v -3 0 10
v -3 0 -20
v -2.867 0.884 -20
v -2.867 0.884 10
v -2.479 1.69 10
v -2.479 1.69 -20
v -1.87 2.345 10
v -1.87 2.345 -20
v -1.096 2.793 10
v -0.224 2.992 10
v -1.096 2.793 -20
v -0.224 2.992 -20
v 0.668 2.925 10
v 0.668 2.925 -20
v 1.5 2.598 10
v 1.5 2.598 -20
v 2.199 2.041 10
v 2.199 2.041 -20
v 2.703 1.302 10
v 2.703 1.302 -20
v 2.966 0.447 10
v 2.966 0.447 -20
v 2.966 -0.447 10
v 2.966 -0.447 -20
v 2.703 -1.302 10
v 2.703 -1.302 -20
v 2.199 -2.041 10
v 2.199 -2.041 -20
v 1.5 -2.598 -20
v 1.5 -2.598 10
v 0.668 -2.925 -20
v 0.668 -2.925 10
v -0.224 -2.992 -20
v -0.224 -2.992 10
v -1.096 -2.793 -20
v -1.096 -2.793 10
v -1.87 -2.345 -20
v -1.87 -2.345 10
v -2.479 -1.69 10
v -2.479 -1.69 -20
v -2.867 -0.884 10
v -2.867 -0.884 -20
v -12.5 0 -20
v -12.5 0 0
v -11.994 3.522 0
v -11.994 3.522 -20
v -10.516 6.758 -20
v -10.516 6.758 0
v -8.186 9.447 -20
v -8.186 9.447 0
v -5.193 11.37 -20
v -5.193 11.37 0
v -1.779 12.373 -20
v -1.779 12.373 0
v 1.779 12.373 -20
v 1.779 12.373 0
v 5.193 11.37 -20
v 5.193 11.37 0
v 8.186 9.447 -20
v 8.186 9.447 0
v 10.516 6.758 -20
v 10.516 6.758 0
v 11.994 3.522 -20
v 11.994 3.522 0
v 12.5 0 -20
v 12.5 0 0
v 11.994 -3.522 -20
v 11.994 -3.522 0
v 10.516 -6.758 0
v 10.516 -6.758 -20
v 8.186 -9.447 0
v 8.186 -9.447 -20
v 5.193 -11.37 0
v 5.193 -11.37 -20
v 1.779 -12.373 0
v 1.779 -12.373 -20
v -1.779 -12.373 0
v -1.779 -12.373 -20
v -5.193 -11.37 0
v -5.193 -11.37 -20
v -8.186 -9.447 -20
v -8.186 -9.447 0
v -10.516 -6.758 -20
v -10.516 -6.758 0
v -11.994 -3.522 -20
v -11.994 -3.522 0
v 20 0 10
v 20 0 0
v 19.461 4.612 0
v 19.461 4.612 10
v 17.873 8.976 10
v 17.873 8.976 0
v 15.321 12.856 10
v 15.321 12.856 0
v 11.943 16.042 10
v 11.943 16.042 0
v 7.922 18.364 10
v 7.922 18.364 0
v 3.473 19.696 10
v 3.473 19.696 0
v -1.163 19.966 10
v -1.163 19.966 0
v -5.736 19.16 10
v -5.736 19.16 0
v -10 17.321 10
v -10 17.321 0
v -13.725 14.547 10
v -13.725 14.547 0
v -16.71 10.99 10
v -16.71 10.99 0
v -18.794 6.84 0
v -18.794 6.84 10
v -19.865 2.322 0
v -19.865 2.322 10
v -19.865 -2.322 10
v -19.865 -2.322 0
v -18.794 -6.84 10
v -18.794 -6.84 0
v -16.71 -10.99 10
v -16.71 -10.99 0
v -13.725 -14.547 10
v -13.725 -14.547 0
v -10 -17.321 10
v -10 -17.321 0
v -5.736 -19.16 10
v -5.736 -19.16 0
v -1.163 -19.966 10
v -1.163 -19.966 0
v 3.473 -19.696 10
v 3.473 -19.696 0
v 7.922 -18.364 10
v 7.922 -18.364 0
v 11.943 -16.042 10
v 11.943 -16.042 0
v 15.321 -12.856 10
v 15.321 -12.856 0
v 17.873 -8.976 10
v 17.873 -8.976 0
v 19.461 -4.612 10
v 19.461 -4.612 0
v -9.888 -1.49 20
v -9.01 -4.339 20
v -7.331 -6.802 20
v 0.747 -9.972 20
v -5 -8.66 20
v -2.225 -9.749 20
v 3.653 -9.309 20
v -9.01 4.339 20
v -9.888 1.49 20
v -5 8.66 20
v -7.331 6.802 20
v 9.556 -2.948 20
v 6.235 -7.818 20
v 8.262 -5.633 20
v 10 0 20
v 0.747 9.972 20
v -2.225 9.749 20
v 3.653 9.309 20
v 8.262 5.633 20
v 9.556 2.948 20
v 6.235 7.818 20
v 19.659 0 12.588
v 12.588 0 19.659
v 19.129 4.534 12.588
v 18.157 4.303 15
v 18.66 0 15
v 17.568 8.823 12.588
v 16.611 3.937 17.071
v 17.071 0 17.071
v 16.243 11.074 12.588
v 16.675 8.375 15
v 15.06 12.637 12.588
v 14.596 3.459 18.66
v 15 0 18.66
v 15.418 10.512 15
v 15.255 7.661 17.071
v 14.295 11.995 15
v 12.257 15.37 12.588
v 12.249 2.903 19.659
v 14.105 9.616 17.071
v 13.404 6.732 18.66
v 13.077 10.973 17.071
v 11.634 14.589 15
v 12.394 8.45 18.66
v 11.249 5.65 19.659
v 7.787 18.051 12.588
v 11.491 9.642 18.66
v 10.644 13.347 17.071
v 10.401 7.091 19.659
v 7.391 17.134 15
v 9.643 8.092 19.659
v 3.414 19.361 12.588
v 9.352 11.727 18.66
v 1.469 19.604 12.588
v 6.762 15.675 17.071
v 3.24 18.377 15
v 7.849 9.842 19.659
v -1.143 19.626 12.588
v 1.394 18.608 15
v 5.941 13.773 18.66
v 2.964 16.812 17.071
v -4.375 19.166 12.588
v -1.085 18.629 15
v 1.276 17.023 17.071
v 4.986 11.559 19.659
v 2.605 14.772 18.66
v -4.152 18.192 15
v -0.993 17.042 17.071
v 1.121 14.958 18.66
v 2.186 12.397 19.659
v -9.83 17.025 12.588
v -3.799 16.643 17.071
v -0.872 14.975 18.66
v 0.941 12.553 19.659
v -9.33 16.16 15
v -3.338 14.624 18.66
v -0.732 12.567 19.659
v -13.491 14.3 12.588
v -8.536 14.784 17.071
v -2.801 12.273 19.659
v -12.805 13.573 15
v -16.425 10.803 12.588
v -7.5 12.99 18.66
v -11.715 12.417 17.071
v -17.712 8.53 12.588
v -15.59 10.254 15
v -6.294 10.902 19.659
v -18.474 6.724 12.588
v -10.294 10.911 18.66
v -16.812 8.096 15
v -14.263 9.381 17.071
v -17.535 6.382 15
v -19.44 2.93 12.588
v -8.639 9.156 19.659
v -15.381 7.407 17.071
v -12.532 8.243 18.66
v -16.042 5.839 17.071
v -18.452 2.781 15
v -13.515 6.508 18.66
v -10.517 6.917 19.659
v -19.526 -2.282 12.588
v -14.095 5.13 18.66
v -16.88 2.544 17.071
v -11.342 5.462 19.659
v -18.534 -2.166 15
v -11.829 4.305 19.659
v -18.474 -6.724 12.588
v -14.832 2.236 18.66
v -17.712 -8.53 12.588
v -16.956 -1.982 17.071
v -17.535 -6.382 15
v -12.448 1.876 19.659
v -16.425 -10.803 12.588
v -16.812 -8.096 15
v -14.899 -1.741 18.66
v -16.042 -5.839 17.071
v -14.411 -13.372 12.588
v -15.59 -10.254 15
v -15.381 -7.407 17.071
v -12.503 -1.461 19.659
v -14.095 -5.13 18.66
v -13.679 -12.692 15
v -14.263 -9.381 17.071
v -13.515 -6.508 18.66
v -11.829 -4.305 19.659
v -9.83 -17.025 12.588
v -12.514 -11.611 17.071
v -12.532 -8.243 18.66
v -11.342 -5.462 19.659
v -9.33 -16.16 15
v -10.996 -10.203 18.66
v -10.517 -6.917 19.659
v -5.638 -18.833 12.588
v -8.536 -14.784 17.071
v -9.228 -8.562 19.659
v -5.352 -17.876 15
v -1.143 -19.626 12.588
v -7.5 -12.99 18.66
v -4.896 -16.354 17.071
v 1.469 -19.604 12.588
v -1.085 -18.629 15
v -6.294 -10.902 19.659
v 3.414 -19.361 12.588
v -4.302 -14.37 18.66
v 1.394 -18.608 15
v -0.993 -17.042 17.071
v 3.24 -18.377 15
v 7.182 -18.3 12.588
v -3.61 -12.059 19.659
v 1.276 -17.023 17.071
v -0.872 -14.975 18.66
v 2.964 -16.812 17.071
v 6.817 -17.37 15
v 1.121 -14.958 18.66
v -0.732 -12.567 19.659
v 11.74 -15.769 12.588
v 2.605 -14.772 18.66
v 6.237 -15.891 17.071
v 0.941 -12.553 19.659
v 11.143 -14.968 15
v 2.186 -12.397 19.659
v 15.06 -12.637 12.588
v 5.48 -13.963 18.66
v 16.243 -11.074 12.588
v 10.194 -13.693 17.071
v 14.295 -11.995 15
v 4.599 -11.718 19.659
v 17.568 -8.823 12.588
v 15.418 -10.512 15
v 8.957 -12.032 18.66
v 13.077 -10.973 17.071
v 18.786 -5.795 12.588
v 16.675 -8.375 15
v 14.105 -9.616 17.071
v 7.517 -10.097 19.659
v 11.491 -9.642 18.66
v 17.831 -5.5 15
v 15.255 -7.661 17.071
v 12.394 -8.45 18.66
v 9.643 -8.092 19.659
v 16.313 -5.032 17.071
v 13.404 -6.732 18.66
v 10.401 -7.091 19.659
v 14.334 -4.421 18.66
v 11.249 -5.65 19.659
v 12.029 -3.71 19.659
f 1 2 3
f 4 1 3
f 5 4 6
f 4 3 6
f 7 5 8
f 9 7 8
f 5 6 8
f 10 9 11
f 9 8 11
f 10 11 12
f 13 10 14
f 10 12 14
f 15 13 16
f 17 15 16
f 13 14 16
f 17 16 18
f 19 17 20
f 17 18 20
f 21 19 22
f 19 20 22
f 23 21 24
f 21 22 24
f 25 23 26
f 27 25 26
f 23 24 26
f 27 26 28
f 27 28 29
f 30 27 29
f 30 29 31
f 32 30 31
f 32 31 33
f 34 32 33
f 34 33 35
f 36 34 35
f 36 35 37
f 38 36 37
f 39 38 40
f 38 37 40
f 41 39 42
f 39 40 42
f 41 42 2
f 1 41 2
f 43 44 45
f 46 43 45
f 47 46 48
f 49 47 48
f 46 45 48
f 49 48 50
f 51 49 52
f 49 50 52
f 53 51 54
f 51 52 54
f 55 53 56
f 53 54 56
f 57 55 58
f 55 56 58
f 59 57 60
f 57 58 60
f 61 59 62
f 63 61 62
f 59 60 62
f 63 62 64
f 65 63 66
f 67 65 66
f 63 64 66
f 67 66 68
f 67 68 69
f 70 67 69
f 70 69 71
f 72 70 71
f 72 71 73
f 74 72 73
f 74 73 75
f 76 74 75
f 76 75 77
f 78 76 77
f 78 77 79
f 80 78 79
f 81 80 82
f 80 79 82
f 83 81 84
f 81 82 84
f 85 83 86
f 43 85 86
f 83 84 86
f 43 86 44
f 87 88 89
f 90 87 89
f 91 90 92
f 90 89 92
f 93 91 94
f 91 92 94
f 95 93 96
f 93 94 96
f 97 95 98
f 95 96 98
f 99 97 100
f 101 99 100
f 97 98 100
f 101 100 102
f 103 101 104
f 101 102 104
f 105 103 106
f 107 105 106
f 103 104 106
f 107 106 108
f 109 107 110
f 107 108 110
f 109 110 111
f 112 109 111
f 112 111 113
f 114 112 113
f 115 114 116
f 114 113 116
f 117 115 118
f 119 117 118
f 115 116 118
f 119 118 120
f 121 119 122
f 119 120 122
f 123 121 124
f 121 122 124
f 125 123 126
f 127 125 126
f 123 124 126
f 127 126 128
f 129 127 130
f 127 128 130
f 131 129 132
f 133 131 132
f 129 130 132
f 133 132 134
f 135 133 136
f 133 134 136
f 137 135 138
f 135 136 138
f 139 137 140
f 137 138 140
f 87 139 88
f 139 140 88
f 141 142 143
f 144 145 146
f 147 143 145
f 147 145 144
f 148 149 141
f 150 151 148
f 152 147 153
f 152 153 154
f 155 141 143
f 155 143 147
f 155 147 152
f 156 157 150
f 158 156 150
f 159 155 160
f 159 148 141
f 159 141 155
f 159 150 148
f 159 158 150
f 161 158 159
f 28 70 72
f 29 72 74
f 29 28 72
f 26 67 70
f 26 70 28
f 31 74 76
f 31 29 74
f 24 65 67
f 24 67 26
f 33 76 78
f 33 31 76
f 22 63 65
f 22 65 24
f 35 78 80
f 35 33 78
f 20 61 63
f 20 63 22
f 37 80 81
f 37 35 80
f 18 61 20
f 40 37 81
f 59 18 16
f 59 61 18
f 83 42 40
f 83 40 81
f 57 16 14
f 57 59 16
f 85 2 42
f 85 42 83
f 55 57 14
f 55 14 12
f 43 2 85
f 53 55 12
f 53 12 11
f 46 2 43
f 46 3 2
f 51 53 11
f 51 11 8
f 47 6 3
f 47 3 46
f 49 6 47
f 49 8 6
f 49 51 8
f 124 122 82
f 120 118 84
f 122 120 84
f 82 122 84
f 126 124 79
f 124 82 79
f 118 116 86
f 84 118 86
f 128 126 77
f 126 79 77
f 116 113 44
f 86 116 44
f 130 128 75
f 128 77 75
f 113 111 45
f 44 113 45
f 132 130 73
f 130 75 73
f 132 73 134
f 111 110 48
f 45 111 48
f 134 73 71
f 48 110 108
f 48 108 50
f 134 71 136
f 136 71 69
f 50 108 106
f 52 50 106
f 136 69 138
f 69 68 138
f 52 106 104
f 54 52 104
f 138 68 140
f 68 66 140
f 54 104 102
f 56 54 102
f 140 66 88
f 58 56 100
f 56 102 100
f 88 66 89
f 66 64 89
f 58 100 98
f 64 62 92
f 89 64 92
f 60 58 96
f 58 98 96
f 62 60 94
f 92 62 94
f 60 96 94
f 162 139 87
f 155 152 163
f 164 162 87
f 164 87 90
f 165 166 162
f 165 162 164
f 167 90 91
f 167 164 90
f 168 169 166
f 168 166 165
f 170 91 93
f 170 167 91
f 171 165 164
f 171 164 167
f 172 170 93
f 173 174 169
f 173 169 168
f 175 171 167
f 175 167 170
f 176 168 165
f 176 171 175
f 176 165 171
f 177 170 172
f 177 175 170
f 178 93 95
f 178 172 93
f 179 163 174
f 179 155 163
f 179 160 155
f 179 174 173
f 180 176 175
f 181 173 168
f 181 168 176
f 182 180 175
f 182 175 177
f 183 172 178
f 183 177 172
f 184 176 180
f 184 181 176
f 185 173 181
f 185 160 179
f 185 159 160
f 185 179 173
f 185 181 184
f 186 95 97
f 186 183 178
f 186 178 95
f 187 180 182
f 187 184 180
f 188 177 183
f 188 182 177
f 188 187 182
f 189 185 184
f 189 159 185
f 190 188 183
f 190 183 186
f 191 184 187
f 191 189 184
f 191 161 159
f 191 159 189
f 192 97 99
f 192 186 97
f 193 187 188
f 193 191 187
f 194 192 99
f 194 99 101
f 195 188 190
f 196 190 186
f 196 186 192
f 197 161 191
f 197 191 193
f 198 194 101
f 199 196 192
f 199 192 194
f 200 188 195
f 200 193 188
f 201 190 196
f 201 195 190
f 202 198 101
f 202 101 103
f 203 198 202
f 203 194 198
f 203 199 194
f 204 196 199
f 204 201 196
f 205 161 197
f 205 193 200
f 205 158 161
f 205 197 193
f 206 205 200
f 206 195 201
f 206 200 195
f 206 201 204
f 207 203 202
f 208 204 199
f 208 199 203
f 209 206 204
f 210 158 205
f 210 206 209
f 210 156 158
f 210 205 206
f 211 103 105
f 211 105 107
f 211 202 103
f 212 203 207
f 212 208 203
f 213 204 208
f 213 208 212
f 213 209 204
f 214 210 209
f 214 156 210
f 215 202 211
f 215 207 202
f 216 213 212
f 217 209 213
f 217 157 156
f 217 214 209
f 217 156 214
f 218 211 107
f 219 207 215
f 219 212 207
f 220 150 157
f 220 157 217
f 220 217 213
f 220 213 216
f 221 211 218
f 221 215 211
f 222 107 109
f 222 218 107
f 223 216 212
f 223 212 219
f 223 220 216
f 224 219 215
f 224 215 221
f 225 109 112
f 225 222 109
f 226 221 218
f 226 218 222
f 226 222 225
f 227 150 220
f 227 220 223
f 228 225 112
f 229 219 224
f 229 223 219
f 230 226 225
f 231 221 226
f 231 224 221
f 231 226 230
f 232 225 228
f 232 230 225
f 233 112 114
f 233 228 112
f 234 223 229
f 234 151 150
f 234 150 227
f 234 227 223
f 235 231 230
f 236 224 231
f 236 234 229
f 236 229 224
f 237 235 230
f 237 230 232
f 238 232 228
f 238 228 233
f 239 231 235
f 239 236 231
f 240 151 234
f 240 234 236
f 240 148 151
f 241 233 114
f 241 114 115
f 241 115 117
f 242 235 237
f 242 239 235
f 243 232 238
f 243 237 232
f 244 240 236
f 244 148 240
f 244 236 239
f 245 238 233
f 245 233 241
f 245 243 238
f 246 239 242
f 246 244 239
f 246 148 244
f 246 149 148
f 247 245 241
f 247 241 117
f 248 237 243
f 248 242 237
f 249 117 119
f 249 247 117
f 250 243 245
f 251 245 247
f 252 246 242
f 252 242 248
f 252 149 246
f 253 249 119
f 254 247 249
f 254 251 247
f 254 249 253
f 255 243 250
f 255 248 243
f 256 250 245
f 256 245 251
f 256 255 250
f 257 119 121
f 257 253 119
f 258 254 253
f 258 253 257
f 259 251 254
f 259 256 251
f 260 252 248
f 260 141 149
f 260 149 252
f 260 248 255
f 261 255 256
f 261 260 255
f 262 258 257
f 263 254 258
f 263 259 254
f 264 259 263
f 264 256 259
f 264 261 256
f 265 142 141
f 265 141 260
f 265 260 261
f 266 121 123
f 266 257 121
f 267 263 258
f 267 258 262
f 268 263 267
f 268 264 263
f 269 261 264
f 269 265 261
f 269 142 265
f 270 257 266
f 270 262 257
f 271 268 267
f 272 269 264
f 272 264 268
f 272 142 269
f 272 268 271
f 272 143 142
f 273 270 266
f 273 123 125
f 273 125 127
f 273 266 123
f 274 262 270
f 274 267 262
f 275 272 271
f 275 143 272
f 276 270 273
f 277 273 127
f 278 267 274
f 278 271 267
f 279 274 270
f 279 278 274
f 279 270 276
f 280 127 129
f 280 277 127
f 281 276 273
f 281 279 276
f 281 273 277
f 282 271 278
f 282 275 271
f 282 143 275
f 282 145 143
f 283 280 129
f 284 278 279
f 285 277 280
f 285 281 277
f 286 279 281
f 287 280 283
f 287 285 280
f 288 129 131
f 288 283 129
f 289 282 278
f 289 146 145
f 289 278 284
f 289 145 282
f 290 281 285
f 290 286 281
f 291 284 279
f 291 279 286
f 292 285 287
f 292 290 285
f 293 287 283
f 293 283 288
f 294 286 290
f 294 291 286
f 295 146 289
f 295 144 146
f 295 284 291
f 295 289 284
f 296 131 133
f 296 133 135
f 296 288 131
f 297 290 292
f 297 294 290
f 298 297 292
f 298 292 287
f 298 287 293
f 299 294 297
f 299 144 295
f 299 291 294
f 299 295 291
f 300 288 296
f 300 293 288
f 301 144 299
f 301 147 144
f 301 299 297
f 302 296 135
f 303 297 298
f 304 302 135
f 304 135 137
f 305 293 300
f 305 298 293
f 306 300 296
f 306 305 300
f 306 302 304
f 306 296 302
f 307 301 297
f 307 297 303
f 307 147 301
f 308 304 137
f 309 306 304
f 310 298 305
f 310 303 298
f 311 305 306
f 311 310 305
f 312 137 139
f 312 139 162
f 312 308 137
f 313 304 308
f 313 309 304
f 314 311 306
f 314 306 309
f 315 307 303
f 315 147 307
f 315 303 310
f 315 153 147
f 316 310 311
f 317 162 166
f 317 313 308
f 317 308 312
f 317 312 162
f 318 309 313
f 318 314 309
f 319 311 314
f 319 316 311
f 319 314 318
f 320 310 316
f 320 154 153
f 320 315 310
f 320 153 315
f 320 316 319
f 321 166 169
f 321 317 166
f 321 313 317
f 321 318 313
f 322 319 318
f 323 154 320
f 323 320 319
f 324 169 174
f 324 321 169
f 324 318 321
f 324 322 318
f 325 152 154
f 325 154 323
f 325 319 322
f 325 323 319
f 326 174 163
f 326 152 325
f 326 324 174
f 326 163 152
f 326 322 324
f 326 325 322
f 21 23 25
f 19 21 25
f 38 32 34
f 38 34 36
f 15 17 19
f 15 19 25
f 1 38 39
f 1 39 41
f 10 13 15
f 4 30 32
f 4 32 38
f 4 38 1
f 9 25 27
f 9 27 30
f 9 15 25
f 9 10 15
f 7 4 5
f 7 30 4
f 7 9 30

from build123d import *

# Parameters (mm, degrees)
ESBO_O1_R                = 20
RESSALTO_EXTRUS_O1_DEPTH = 20
FILETE1_R                = 10
ESBO_O3_R                = 12.5
RESSALTO_EXTRUS_O2_DEPTH = 20
ESBO_O6_R                = 3
CORTE_EXTRUS_O1_DEPTH    = 30


with BuildPart() as part:
    # Esboço1 → Ressalto-extrusão1 (new body)
    with BuildSketch(Plane.XY):
        Circle(ESBO_O1_R)
    extrude(amount=RESSALTO_EXTRUS_O1_DEPTH)

    # Filete1
    filete1_edges = [part.edges().sort_by_distance(p)[0] for p in [
        (-20, 0, 20),
    ]]
    fillet(filete1_edges, radius=FILETE1_R)

    # Esboço3 → Ressalto-extrusão2 (add)
    with BuildSketch(Plane(origin=(0, 0, 0), x_dir=(-1, 0, 0), z_dir=(0, 0, -1))):
        Circle(ESBO_O3_R)
    extrude(amount=RESSALTO_EXTRUS_O2_DEPTH)

    # Esboço6 → Corte-extrusão1 (cut)
    with BuildSketch(Plane(origin=(0, 0, -20), x_dir=(-1, 0, 0), z_dir=(0, 0, -1))):
        Circle(ESBO_O6_R)
    extrude(amount=-CORTE_EXTRUS_O1_DEPTH, mode=Mode.SUBTRACT)


solid = part.part
